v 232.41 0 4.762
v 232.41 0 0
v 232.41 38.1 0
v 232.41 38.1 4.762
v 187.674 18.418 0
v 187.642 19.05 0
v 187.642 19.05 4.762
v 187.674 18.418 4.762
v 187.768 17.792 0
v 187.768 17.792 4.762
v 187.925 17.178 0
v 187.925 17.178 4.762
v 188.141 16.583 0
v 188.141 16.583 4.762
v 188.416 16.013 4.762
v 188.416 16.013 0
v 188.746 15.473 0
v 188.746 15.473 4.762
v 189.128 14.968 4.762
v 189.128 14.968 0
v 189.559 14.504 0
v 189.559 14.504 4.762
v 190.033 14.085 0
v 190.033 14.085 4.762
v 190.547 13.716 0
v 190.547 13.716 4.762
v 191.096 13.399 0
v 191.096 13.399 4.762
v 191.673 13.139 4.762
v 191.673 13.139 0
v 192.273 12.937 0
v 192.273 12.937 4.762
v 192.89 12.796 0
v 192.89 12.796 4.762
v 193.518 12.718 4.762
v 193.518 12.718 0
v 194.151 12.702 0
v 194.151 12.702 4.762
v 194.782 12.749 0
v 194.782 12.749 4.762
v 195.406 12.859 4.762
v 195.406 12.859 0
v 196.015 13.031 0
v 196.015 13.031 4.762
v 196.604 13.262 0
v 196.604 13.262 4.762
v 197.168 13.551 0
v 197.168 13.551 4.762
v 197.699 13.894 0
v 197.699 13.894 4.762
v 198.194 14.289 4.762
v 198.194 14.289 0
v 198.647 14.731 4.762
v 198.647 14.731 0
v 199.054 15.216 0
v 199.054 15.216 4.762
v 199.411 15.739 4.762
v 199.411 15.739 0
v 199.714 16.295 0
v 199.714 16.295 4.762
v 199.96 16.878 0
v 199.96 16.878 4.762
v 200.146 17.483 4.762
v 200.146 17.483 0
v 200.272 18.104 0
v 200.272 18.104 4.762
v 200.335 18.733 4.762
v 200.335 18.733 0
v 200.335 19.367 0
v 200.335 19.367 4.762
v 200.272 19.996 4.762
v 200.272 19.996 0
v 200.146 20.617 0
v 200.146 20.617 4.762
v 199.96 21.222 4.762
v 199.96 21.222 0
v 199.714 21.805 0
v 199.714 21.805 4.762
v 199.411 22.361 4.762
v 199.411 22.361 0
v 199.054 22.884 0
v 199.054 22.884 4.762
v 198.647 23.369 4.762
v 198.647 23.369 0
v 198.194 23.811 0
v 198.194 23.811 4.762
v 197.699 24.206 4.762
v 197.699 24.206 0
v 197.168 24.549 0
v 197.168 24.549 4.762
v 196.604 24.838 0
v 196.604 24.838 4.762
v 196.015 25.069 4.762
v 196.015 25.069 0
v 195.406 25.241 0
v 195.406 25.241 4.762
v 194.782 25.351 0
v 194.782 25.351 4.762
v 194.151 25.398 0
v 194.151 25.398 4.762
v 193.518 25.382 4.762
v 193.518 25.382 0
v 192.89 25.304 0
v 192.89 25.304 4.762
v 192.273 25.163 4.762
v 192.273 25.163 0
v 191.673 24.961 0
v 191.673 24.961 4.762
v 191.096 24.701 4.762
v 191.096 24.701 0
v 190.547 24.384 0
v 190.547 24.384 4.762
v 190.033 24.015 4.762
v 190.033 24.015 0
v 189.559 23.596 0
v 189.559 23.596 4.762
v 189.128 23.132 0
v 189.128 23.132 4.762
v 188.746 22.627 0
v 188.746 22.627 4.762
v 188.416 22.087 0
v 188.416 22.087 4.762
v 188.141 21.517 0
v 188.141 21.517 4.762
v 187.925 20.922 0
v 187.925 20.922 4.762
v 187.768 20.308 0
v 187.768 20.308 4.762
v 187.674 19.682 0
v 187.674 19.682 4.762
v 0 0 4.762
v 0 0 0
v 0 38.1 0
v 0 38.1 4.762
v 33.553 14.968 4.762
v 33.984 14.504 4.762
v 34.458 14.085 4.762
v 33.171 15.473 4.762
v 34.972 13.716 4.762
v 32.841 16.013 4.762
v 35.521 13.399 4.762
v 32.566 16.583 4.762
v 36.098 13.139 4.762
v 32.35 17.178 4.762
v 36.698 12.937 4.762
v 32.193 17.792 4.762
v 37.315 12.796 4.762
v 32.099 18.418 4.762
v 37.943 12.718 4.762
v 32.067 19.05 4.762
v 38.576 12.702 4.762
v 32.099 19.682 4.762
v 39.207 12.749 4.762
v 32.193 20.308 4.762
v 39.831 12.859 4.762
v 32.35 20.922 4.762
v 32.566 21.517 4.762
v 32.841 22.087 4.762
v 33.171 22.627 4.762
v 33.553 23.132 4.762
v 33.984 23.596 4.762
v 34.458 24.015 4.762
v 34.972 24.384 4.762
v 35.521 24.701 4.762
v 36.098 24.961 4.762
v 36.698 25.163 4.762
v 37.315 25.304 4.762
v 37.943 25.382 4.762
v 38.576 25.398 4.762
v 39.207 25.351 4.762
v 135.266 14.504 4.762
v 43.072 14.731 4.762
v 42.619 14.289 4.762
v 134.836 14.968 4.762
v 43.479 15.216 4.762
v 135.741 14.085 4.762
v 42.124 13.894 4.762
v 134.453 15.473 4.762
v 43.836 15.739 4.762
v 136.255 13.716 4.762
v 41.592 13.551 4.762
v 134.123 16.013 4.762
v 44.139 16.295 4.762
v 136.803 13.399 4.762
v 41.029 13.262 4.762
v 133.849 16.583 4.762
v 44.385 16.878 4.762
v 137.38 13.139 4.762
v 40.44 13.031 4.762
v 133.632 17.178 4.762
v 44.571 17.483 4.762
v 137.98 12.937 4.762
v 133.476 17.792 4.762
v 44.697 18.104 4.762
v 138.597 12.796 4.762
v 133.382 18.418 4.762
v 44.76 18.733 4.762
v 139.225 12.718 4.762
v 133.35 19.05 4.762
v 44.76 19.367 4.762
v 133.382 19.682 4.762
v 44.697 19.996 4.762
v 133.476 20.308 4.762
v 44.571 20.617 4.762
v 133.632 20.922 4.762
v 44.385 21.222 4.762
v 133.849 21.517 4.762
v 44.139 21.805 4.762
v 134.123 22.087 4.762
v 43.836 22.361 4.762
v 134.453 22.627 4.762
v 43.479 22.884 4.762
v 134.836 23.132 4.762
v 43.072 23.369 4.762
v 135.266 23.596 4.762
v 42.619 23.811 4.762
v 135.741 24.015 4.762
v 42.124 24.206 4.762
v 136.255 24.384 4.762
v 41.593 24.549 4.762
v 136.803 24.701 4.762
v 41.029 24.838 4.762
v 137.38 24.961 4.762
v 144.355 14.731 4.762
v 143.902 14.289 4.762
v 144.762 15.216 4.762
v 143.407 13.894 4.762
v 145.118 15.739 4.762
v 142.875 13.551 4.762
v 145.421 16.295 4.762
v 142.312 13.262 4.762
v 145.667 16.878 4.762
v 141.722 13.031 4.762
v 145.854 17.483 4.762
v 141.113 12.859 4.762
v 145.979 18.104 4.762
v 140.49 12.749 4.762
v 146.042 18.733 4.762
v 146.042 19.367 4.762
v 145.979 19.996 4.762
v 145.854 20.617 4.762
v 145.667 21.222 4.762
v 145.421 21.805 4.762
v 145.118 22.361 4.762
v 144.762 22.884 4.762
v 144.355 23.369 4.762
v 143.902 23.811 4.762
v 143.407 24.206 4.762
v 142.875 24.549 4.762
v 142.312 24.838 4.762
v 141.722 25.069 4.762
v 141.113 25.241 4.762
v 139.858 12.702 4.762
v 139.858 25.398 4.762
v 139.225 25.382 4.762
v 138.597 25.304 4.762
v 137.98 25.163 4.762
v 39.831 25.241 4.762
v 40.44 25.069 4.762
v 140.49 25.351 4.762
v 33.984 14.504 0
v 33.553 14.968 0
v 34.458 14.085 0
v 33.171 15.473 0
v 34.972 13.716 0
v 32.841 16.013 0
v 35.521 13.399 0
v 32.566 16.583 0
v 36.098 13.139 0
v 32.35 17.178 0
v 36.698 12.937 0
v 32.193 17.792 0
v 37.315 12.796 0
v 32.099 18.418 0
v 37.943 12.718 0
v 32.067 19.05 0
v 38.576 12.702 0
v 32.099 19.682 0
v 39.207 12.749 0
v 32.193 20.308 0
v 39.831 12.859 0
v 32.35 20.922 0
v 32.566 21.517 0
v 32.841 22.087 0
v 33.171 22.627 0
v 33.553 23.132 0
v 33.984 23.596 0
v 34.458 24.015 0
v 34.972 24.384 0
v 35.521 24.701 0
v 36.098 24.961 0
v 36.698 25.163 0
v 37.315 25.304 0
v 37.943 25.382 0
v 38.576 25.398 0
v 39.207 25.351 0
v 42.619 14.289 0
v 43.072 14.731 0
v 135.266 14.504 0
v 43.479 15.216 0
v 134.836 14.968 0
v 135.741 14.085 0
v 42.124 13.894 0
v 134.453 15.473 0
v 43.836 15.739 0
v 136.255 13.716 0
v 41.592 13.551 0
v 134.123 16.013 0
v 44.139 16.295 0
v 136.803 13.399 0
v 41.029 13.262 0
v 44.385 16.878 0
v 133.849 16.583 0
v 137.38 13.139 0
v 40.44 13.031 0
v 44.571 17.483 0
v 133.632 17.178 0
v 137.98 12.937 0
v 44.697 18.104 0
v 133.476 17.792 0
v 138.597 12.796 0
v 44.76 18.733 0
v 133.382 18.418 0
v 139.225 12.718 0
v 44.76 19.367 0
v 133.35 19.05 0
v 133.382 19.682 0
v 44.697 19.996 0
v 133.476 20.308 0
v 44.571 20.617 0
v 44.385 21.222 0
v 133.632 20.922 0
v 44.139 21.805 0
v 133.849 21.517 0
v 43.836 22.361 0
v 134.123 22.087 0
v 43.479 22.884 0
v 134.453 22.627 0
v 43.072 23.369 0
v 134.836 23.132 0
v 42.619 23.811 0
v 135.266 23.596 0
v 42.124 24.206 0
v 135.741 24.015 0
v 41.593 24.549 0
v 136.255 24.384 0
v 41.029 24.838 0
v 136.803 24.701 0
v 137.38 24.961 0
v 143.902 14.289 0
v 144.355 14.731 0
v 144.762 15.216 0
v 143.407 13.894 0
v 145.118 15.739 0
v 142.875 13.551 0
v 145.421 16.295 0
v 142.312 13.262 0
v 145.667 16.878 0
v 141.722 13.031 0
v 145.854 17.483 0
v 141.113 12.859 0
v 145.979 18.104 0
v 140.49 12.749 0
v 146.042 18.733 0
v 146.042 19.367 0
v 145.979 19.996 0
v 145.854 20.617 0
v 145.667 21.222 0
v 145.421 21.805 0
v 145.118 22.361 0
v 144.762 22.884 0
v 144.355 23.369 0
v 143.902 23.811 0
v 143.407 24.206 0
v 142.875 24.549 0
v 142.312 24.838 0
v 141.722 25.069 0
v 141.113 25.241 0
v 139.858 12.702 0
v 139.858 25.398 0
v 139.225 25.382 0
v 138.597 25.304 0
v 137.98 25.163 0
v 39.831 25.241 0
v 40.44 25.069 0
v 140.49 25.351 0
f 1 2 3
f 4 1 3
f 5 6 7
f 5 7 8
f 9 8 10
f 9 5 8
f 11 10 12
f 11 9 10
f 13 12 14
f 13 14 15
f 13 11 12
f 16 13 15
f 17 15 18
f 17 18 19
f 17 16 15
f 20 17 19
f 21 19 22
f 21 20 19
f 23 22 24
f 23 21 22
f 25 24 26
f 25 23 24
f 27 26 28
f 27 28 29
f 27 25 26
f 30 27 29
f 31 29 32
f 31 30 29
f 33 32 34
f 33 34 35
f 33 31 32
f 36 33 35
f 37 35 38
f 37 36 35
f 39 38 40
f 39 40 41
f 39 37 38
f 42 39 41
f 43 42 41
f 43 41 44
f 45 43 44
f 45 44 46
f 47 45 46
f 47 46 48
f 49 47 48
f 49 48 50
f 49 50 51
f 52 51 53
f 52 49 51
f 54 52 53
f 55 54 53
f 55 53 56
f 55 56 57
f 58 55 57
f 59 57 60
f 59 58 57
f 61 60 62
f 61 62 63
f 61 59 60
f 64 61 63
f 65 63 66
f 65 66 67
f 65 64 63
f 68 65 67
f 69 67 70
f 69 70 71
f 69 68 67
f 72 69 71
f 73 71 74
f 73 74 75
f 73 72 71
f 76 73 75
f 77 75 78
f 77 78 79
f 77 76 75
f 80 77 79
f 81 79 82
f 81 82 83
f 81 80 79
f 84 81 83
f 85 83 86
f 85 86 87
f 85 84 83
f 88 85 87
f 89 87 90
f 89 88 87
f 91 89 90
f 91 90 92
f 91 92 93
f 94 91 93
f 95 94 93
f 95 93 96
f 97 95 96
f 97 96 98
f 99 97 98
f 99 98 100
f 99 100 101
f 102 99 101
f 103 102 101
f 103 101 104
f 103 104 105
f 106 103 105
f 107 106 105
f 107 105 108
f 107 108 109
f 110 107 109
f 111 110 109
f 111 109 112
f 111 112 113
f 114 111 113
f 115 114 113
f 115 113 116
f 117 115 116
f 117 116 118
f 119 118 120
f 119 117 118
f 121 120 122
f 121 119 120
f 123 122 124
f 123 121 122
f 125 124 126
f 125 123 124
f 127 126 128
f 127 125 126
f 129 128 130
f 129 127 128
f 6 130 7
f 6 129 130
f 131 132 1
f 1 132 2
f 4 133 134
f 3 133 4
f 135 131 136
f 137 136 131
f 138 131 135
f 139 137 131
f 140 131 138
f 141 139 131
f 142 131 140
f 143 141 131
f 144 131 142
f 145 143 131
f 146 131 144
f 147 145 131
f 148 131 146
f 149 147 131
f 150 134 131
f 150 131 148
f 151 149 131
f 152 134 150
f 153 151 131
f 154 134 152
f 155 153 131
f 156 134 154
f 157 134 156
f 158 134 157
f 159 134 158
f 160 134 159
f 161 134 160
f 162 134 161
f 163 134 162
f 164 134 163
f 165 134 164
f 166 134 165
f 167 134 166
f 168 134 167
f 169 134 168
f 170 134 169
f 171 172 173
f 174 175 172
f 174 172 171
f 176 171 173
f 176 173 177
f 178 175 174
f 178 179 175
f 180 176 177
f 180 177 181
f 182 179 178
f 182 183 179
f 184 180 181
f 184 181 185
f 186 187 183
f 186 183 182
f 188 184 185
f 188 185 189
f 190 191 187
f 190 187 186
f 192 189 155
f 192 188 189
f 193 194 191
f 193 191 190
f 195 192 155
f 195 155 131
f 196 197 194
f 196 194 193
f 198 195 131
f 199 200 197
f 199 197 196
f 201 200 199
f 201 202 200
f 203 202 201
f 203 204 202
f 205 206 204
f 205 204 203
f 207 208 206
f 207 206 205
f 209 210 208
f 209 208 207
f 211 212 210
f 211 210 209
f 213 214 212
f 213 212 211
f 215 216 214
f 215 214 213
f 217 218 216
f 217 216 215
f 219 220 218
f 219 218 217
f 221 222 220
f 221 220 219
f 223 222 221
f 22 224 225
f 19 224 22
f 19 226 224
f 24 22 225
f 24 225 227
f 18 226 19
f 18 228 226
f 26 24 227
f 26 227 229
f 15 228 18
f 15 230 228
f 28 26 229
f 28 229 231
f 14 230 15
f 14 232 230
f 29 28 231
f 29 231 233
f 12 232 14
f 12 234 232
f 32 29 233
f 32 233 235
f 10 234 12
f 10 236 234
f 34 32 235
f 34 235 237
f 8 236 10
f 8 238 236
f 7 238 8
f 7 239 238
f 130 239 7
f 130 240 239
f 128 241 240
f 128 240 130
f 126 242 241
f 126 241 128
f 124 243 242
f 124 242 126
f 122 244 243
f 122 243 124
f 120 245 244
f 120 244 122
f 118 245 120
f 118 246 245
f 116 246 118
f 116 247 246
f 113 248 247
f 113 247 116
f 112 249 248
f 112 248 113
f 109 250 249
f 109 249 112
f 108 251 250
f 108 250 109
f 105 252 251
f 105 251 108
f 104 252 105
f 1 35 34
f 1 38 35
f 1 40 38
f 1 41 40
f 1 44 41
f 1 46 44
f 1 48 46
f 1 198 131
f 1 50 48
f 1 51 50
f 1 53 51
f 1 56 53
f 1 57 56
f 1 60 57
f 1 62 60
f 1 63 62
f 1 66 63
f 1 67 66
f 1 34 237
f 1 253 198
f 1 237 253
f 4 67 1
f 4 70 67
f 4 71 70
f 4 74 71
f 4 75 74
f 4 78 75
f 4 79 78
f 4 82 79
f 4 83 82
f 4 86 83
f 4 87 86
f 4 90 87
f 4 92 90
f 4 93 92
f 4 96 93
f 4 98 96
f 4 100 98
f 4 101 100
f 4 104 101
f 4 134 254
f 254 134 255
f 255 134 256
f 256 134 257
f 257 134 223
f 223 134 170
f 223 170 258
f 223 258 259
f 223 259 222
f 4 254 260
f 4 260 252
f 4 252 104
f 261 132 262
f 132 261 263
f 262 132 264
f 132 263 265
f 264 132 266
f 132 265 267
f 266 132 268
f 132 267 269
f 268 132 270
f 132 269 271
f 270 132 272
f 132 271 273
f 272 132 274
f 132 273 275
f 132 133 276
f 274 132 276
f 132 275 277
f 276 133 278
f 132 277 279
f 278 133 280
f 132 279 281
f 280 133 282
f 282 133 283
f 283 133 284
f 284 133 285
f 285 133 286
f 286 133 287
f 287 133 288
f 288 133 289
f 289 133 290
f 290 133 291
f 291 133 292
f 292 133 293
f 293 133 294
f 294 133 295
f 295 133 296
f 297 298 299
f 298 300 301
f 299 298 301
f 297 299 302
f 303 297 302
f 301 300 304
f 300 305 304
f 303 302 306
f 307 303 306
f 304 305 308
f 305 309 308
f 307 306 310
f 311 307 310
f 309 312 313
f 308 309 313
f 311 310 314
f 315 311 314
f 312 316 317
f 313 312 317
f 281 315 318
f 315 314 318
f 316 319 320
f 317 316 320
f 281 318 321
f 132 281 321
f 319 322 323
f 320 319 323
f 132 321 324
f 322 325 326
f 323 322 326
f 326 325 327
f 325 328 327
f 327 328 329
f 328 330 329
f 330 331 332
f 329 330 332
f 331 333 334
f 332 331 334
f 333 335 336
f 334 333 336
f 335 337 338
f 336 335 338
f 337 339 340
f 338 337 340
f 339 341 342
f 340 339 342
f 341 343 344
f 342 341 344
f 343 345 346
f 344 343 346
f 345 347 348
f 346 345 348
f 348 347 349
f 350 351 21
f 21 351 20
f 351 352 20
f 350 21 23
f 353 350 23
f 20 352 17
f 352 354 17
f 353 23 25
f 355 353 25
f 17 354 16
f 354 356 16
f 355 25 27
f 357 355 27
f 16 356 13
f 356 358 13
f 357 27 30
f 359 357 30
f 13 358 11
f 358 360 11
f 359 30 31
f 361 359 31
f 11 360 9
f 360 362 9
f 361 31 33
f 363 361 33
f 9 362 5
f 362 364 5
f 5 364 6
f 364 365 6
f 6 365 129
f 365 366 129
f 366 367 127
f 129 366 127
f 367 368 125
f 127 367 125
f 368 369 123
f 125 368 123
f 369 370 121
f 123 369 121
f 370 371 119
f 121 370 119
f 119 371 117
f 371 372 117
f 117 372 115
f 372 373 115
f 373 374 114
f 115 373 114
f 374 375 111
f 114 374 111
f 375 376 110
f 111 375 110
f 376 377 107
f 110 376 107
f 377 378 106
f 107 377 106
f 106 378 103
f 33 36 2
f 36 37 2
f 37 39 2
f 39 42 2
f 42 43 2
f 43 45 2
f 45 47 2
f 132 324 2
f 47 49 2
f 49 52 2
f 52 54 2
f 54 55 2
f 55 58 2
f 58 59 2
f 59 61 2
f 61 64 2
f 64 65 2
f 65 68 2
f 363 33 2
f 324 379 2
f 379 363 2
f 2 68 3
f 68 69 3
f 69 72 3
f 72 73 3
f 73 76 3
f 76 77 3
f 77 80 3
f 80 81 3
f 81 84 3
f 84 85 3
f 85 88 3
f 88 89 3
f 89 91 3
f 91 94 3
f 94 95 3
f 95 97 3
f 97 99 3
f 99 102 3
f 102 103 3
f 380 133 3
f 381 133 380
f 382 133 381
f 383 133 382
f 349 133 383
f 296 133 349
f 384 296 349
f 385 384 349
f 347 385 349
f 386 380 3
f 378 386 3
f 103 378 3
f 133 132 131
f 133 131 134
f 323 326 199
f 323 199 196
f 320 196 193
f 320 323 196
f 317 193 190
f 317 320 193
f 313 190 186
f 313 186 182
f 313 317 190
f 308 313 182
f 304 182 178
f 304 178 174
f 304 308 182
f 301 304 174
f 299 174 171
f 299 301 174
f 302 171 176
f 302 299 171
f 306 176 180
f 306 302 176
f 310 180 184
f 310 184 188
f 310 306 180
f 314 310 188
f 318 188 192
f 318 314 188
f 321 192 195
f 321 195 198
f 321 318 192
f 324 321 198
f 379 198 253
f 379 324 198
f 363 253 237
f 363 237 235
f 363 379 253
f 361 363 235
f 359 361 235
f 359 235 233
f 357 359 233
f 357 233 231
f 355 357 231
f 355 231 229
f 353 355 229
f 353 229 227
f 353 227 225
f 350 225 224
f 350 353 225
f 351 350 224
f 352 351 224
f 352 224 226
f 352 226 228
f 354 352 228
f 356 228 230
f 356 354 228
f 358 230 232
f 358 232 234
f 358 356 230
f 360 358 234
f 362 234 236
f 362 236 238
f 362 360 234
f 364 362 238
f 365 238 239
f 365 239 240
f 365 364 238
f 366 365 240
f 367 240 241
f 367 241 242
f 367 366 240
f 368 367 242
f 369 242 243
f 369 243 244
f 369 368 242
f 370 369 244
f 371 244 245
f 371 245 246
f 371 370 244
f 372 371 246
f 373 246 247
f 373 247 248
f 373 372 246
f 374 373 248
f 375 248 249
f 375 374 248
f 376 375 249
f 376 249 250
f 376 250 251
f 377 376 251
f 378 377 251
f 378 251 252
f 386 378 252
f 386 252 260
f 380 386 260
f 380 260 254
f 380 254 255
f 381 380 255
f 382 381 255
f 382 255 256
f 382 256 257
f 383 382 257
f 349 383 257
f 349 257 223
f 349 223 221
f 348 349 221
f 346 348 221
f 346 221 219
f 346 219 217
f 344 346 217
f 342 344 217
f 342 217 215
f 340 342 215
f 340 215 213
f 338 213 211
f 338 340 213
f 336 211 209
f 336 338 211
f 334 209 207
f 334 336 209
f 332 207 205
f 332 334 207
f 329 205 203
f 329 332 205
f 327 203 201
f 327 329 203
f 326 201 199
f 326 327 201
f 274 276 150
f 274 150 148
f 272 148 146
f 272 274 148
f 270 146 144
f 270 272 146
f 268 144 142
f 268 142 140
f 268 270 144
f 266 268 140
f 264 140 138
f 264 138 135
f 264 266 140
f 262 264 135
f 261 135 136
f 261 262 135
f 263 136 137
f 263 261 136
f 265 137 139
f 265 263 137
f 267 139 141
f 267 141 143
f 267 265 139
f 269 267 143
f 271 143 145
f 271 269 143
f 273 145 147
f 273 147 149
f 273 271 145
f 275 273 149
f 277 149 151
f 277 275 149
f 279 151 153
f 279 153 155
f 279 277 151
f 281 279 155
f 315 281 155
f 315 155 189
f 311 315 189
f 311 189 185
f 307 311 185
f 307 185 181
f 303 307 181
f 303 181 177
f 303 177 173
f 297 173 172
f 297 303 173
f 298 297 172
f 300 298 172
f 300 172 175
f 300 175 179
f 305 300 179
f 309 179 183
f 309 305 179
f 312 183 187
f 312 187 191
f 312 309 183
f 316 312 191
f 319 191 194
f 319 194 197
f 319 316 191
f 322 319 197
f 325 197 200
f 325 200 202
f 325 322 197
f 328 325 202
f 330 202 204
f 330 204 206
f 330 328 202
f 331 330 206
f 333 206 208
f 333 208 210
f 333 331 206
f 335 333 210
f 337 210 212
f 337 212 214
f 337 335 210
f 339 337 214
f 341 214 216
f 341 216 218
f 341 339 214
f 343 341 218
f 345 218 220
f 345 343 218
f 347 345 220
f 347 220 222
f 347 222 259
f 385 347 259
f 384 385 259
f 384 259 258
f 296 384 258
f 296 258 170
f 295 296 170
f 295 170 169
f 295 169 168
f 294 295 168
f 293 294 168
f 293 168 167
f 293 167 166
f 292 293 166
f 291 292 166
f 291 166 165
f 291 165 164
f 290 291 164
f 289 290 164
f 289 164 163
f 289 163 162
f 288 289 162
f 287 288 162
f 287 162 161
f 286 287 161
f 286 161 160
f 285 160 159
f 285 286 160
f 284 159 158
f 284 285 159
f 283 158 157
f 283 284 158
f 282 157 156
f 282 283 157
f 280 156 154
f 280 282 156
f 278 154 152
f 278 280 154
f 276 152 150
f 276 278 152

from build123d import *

# Parameters (mm, degrees)
SKETCH1_W           = 232.41
SKETCH1_H           = 38.1
SKETCH1_R           = 6.35
BOSS_EXTRUDE1_DEPTH = 4.7625


with BuildPart() as part:
    # Sketch1 → Boss-Extrude1 (new body)
    with BuildSketch(Plane.XY):
        with Locations((116.205, 19.05)):
            Rectangle(SKETCH1_W, SKETCH1_H)
        with Locations(Location((38.4175, 19.05, 0), (0, 0, 180))):
            Circle(SKETCH1_R, mode=Mode.SUBTRACT)
        with Locations(Location((193.9925, 19.05, 0), (0, 0, 180))):
            Circle(SKETCH1_R, mode=Mode.SUBTRACT)
        with Locations(Location((139.7, 19.05, 0), (0, 0, 180))):
            Circle(SKETCH1_R, mode=Mode.SUBTRACT)
    extrude(amount=BOSS_EXTRUDE1_DEPTH)


solid = part.part
